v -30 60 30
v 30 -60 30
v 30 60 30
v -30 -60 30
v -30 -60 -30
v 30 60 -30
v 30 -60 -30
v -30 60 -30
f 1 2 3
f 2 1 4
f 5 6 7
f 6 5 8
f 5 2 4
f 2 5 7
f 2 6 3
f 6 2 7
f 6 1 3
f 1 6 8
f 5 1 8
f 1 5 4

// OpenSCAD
// ========================================
// a 60 x 120 x 60 mm box
// NeuroCAD canonical IR; dimensions are millimetres
// ========================================
$fn = 48;

cube(size=[60, 120, 60], center=true);
